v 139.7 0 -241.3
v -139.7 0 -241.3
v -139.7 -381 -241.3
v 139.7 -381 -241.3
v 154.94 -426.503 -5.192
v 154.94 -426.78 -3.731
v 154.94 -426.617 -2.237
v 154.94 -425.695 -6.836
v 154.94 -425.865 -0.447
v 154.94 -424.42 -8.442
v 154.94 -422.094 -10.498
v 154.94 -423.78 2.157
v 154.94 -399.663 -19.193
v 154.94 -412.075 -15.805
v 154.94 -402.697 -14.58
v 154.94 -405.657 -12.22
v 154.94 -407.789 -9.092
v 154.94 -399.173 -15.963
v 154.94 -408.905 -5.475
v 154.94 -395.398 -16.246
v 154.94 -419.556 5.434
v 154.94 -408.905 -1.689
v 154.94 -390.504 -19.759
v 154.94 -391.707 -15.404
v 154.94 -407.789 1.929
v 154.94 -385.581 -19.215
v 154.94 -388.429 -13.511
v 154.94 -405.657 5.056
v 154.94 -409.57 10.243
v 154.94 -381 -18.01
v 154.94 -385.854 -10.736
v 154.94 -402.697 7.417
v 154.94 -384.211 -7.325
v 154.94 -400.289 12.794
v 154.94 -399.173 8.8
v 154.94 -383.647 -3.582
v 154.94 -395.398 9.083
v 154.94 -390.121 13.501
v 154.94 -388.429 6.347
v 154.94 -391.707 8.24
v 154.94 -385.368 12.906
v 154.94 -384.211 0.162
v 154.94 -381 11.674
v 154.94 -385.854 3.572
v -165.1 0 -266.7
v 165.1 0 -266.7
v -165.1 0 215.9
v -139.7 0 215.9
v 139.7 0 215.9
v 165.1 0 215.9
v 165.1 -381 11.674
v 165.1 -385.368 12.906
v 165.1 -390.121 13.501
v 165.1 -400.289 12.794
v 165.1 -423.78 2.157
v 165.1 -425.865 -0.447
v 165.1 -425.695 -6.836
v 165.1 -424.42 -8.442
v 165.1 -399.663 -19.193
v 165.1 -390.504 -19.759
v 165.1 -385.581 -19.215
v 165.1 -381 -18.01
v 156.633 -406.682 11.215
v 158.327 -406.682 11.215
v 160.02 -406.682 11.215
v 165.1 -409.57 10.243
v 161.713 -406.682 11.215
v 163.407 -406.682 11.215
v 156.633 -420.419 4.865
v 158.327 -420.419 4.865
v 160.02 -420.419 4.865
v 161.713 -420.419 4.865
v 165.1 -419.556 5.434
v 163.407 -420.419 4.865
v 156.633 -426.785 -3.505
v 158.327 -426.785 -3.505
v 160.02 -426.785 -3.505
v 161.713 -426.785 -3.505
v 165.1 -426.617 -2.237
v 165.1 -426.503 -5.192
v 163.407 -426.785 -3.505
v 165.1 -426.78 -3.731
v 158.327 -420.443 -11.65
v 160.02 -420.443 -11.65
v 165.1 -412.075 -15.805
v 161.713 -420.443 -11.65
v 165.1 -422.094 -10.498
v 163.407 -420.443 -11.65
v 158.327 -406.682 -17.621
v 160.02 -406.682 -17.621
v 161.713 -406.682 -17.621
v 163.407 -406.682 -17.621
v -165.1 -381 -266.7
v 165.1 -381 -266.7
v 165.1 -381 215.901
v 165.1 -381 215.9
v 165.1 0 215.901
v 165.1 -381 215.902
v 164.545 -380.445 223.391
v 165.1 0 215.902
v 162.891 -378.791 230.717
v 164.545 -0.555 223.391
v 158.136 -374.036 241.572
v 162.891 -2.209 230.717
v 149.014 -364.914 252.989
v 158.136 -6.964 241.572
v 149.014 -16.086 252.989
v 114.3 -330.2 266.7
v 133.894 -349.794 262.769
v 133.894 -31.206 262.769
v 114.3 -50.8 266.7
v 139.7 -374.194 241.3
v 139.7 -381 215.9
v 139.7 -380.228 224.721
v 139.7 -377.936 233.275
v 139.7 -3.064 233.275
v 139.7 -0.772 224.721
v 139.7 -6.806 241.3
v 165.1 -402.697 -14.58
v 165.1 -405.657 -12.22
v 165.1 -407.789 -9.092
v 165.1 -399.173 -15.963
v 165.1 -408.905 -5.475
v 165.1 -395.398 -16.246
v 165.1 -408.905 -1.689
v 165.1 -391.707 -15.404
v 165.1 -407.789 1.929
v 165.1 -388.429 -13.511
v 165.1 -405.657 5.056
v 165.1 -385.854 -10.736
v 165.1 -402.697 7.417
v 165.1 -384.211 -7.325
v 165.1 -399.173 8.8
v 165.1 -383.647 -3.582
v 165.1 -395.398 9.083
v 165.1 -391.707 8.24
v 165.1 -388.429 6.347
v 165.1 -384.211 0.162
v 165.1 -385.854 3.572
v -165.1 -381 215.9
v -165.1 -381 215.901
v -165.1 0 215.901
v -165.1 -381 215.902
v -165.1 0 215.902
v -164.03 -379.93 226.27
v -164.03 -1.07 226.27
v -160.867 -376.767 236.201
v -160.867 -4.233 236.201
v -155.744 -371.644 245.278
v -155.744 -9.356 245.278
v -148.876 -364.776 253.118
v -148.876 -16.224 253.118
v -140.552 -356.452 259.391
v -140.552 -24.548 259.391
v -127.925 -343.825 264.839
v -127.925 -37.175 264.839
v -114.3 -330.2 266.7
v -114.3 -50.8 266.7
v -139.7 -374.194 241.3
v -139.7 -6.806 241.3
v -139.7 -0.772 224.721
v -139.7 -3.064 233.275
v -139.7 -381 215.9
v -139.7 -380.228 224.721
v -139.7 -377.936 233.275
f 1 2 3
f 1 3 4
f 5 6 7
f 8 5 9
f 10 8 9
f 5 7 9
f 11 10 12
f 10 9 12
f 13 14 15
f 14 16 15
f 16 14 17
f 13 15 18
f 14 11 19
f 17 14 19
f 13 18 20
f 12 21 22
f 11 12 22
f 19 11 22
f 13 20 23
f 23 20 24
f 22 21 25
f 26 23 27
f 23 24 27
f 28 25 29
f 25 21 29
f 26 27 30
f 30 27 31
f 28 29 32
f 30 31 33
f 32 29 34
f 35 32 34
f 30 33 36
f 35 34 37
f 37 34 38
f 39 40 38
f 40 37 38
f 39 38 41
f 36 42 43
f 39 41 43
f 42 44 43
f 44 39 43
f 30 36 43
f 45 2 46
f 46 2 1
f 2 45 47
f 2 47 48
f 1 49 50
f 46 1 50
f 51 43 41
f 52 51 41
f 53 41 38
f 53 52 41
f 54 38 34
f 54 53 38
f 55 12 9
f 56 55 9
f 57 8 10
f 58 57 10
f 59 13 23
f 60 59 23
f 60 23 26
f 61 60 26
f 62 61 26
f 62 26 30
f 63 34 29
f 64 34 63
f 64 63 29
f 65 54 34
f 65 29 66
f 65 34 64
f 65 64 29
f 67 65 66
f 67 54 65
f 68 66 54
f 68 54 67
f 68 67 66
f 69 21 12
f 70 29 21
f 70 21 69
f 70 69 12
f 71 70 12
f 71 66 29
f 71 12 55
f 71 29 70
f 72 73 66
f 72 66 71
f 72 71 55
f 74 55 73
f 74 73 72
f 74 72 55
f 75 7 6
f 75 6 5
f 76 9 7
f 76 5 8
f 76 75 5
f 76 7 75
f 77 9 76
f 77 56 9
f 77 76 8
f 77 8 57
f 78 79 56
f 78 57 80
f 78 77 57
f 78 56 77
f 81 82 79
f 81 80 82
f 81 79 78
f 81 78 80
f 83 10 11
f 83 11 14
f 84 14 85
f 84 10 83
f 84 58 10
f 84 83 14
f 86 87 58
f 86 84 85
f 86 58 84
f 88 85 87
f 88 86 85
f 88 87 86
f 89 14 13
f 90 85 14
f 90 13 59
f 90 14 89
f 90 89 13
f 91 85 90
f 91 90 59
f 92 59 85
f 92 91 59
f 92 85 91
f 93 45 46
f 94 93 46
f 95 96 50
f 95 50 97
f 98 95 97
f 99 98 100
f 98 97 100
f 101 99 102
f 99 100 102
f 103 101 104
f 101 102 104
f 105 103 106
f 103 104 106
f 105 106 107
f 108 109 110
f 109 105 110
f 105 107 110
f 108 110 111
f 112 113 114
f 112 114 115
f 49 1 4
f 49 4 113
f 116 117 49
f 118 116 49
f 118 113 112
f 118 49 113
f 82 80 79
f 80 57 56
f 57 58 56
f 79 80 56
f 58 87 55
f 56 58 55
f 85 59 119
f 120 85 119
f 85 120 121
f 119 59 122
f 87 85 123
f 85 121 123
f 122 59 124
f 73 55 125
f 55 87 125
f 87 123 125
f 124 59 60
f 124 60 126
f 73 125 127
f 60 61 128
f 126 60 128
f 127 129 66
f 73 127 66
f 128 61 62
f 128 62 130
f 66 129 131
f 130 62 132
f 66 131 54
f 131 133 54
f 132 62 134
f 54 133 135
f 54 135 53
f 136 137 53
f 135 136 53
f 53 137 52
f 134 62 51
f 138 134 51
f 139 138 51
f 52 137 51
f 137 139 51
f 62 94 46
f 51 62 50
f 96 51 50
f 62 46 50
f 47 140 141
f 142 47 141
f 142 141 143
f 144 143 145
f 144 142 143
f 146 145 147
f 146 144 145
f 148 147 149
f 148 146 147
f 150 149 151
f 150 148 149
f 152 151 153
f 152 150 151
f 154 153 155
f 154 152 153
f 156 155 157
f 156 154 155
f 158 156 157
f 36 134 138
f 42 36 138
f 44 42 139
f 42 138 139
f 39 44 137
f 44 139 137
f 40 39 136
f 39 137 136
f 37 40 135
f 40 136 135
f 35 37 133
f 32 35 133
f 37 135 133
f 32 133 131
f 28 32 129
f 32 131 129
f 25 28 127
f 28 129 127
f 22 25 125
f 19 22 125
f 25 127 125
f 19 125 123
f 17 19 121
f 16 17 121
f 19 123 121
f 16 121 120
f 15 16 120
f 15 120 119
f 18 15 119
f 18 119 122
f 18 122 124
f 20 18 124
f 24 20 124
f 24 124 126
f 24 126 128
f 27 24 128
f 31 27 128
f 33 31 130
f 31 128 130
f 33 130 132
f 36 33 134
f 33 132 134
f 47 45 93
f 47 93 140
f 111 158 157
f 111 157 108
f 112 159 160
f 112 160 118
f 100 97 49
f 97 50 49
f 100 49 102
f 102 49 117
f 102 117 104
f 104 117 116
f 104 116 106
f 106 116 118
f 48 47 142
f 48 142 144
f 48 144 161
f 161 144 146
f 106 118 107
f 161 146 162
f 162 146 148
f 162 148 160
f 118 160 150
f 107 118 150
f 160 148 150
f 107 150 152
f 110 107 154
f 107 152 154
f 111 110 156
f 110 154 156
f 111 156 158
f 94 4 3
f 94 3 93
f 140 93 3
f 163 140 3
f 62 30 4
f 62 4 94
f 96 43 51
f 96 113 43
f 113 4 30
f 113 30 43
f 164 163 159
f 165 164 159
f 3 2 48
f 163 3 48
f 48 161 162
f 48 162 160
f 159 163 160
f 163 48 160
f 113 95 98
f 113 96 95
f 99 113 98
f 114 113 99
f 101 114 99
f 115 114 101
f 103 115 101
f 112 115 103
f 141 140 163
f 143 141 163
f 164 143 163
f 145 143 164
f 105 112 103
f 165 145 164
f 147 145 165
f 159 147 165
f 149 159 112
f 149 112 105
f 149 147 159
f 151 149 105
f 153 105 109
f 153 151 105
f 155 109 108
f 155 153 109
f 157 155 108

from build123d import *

# Parameters (mm, degrees)
F0_W        = 330.2
F0_H        = 533.4
F0_W_2      = 279.4
F0_H_2      = 482.6
F1_DEPTH    = 381
F2_R        = 12.7
F3_DEPTH    = 10.16
F4_T1_DEPTH = 635
F4_T3_DEPTH = 584.2


# Not quite as in the source:
# - a fillet or chamfer that OpenCascade refuses, or shapes differently, is made with other operations: its cross-section is extruded or revolved along the edge and cut away or added


with BuildPart() as f1:
    # F0 (on Front) → F1 (new body)
    with BuildSketch(Plane.XZ):
        Rectangle(F0_W, F0_H)
        Rectangle(F0_W_2, F0_H_2, mode=Mode.SUBTRACT)
    extrude(amount=F1_DEPTH)

    # F2 (on face) → F3 (join)
    with BuildSketch(Plane.YZ.offset(165.1)):
        with BuildLine():
            add(Edge.make_bspline(
                [(-378.2229094568, 10.4518691667), (-385.9598838993, 14.4257039209), (-405.6146401633, 14.5371341372), (-437.0263849997, -3.7421973966), (-405.4977582368, -20.7209483443), (-378.1421616626, -20.5633411646), (-363.038665815, -3.6640736551), (-372.1410397823, 7.3281228932), (-378.2229094568, 10.4518691667)],
                knots=[0, 0, 0, 0, 0.1843978335, 0.3570613059, 0.5281889509, 0.7125867844, 0.8550488179, 1, 1, 1, 1], degree=3))
        make_face()
        with Locations((-396.3470816139, -3.5818209283)):
            Circle(F2_R, mode=Mode.SUBTRACT)
    extrude(amount=-F3_DEPTH)

    # F4: fillet of radius 50.8 on 4 edges, made by hand

    # F4_s2 → F4_t1 (cut)
    with BuildSketch(Plane.XZ.offset(-127)):
        with BuildLine():
            ThreePointArc((165.1, 215.9), (150.2210244843, 251.8210244843), (114.3, 266.7))
            Line((114.3, 266.7), (165.1, 266.7))
            Line((165.1, 266.7), (165.1, 215.9))
        make_face()
        with BuildLine():
            ThreePointArc((-165.1, 215.9), (-150.2210244843, 251.8210244843), (-114.3, 266.7))
            Line((-114.3, 266.7), (-165.1, 266.7))
            Line((-165.1, 266.7), (-165.1, 215.9))
        make_face()
    extrude(amount=F4_T1_DEPTH, mode=Mode.SUBTRACT)

    # F4_s4 → F4_t3 (cut)
    with BuildSketch(Plane.YZ.offset(-292.1)):
        with BuildLine():
            ThreePointArc((0, 215.9), (-14.8789755157, 251.8210244843), (-50.8, 266.7))
            Line((-50.8, 266.7), (0, 266.7))
            Line((0, 266.7), (0, 215.9))
        make_face()
        with BuildLine():
            ThreePointArc((-381, 215.9), (-366.1210244843, 251.8210244843), (-330.2, 266.7))
            Line((-330.2, 266.7), (-381, 266.7))
            Line((-381, 266.7), (-381, 215.9))
        make_face()
    extrude(amount=F4_T3_DEPTH, mode=Mode.SUBTRACT)


solid = f1.part
